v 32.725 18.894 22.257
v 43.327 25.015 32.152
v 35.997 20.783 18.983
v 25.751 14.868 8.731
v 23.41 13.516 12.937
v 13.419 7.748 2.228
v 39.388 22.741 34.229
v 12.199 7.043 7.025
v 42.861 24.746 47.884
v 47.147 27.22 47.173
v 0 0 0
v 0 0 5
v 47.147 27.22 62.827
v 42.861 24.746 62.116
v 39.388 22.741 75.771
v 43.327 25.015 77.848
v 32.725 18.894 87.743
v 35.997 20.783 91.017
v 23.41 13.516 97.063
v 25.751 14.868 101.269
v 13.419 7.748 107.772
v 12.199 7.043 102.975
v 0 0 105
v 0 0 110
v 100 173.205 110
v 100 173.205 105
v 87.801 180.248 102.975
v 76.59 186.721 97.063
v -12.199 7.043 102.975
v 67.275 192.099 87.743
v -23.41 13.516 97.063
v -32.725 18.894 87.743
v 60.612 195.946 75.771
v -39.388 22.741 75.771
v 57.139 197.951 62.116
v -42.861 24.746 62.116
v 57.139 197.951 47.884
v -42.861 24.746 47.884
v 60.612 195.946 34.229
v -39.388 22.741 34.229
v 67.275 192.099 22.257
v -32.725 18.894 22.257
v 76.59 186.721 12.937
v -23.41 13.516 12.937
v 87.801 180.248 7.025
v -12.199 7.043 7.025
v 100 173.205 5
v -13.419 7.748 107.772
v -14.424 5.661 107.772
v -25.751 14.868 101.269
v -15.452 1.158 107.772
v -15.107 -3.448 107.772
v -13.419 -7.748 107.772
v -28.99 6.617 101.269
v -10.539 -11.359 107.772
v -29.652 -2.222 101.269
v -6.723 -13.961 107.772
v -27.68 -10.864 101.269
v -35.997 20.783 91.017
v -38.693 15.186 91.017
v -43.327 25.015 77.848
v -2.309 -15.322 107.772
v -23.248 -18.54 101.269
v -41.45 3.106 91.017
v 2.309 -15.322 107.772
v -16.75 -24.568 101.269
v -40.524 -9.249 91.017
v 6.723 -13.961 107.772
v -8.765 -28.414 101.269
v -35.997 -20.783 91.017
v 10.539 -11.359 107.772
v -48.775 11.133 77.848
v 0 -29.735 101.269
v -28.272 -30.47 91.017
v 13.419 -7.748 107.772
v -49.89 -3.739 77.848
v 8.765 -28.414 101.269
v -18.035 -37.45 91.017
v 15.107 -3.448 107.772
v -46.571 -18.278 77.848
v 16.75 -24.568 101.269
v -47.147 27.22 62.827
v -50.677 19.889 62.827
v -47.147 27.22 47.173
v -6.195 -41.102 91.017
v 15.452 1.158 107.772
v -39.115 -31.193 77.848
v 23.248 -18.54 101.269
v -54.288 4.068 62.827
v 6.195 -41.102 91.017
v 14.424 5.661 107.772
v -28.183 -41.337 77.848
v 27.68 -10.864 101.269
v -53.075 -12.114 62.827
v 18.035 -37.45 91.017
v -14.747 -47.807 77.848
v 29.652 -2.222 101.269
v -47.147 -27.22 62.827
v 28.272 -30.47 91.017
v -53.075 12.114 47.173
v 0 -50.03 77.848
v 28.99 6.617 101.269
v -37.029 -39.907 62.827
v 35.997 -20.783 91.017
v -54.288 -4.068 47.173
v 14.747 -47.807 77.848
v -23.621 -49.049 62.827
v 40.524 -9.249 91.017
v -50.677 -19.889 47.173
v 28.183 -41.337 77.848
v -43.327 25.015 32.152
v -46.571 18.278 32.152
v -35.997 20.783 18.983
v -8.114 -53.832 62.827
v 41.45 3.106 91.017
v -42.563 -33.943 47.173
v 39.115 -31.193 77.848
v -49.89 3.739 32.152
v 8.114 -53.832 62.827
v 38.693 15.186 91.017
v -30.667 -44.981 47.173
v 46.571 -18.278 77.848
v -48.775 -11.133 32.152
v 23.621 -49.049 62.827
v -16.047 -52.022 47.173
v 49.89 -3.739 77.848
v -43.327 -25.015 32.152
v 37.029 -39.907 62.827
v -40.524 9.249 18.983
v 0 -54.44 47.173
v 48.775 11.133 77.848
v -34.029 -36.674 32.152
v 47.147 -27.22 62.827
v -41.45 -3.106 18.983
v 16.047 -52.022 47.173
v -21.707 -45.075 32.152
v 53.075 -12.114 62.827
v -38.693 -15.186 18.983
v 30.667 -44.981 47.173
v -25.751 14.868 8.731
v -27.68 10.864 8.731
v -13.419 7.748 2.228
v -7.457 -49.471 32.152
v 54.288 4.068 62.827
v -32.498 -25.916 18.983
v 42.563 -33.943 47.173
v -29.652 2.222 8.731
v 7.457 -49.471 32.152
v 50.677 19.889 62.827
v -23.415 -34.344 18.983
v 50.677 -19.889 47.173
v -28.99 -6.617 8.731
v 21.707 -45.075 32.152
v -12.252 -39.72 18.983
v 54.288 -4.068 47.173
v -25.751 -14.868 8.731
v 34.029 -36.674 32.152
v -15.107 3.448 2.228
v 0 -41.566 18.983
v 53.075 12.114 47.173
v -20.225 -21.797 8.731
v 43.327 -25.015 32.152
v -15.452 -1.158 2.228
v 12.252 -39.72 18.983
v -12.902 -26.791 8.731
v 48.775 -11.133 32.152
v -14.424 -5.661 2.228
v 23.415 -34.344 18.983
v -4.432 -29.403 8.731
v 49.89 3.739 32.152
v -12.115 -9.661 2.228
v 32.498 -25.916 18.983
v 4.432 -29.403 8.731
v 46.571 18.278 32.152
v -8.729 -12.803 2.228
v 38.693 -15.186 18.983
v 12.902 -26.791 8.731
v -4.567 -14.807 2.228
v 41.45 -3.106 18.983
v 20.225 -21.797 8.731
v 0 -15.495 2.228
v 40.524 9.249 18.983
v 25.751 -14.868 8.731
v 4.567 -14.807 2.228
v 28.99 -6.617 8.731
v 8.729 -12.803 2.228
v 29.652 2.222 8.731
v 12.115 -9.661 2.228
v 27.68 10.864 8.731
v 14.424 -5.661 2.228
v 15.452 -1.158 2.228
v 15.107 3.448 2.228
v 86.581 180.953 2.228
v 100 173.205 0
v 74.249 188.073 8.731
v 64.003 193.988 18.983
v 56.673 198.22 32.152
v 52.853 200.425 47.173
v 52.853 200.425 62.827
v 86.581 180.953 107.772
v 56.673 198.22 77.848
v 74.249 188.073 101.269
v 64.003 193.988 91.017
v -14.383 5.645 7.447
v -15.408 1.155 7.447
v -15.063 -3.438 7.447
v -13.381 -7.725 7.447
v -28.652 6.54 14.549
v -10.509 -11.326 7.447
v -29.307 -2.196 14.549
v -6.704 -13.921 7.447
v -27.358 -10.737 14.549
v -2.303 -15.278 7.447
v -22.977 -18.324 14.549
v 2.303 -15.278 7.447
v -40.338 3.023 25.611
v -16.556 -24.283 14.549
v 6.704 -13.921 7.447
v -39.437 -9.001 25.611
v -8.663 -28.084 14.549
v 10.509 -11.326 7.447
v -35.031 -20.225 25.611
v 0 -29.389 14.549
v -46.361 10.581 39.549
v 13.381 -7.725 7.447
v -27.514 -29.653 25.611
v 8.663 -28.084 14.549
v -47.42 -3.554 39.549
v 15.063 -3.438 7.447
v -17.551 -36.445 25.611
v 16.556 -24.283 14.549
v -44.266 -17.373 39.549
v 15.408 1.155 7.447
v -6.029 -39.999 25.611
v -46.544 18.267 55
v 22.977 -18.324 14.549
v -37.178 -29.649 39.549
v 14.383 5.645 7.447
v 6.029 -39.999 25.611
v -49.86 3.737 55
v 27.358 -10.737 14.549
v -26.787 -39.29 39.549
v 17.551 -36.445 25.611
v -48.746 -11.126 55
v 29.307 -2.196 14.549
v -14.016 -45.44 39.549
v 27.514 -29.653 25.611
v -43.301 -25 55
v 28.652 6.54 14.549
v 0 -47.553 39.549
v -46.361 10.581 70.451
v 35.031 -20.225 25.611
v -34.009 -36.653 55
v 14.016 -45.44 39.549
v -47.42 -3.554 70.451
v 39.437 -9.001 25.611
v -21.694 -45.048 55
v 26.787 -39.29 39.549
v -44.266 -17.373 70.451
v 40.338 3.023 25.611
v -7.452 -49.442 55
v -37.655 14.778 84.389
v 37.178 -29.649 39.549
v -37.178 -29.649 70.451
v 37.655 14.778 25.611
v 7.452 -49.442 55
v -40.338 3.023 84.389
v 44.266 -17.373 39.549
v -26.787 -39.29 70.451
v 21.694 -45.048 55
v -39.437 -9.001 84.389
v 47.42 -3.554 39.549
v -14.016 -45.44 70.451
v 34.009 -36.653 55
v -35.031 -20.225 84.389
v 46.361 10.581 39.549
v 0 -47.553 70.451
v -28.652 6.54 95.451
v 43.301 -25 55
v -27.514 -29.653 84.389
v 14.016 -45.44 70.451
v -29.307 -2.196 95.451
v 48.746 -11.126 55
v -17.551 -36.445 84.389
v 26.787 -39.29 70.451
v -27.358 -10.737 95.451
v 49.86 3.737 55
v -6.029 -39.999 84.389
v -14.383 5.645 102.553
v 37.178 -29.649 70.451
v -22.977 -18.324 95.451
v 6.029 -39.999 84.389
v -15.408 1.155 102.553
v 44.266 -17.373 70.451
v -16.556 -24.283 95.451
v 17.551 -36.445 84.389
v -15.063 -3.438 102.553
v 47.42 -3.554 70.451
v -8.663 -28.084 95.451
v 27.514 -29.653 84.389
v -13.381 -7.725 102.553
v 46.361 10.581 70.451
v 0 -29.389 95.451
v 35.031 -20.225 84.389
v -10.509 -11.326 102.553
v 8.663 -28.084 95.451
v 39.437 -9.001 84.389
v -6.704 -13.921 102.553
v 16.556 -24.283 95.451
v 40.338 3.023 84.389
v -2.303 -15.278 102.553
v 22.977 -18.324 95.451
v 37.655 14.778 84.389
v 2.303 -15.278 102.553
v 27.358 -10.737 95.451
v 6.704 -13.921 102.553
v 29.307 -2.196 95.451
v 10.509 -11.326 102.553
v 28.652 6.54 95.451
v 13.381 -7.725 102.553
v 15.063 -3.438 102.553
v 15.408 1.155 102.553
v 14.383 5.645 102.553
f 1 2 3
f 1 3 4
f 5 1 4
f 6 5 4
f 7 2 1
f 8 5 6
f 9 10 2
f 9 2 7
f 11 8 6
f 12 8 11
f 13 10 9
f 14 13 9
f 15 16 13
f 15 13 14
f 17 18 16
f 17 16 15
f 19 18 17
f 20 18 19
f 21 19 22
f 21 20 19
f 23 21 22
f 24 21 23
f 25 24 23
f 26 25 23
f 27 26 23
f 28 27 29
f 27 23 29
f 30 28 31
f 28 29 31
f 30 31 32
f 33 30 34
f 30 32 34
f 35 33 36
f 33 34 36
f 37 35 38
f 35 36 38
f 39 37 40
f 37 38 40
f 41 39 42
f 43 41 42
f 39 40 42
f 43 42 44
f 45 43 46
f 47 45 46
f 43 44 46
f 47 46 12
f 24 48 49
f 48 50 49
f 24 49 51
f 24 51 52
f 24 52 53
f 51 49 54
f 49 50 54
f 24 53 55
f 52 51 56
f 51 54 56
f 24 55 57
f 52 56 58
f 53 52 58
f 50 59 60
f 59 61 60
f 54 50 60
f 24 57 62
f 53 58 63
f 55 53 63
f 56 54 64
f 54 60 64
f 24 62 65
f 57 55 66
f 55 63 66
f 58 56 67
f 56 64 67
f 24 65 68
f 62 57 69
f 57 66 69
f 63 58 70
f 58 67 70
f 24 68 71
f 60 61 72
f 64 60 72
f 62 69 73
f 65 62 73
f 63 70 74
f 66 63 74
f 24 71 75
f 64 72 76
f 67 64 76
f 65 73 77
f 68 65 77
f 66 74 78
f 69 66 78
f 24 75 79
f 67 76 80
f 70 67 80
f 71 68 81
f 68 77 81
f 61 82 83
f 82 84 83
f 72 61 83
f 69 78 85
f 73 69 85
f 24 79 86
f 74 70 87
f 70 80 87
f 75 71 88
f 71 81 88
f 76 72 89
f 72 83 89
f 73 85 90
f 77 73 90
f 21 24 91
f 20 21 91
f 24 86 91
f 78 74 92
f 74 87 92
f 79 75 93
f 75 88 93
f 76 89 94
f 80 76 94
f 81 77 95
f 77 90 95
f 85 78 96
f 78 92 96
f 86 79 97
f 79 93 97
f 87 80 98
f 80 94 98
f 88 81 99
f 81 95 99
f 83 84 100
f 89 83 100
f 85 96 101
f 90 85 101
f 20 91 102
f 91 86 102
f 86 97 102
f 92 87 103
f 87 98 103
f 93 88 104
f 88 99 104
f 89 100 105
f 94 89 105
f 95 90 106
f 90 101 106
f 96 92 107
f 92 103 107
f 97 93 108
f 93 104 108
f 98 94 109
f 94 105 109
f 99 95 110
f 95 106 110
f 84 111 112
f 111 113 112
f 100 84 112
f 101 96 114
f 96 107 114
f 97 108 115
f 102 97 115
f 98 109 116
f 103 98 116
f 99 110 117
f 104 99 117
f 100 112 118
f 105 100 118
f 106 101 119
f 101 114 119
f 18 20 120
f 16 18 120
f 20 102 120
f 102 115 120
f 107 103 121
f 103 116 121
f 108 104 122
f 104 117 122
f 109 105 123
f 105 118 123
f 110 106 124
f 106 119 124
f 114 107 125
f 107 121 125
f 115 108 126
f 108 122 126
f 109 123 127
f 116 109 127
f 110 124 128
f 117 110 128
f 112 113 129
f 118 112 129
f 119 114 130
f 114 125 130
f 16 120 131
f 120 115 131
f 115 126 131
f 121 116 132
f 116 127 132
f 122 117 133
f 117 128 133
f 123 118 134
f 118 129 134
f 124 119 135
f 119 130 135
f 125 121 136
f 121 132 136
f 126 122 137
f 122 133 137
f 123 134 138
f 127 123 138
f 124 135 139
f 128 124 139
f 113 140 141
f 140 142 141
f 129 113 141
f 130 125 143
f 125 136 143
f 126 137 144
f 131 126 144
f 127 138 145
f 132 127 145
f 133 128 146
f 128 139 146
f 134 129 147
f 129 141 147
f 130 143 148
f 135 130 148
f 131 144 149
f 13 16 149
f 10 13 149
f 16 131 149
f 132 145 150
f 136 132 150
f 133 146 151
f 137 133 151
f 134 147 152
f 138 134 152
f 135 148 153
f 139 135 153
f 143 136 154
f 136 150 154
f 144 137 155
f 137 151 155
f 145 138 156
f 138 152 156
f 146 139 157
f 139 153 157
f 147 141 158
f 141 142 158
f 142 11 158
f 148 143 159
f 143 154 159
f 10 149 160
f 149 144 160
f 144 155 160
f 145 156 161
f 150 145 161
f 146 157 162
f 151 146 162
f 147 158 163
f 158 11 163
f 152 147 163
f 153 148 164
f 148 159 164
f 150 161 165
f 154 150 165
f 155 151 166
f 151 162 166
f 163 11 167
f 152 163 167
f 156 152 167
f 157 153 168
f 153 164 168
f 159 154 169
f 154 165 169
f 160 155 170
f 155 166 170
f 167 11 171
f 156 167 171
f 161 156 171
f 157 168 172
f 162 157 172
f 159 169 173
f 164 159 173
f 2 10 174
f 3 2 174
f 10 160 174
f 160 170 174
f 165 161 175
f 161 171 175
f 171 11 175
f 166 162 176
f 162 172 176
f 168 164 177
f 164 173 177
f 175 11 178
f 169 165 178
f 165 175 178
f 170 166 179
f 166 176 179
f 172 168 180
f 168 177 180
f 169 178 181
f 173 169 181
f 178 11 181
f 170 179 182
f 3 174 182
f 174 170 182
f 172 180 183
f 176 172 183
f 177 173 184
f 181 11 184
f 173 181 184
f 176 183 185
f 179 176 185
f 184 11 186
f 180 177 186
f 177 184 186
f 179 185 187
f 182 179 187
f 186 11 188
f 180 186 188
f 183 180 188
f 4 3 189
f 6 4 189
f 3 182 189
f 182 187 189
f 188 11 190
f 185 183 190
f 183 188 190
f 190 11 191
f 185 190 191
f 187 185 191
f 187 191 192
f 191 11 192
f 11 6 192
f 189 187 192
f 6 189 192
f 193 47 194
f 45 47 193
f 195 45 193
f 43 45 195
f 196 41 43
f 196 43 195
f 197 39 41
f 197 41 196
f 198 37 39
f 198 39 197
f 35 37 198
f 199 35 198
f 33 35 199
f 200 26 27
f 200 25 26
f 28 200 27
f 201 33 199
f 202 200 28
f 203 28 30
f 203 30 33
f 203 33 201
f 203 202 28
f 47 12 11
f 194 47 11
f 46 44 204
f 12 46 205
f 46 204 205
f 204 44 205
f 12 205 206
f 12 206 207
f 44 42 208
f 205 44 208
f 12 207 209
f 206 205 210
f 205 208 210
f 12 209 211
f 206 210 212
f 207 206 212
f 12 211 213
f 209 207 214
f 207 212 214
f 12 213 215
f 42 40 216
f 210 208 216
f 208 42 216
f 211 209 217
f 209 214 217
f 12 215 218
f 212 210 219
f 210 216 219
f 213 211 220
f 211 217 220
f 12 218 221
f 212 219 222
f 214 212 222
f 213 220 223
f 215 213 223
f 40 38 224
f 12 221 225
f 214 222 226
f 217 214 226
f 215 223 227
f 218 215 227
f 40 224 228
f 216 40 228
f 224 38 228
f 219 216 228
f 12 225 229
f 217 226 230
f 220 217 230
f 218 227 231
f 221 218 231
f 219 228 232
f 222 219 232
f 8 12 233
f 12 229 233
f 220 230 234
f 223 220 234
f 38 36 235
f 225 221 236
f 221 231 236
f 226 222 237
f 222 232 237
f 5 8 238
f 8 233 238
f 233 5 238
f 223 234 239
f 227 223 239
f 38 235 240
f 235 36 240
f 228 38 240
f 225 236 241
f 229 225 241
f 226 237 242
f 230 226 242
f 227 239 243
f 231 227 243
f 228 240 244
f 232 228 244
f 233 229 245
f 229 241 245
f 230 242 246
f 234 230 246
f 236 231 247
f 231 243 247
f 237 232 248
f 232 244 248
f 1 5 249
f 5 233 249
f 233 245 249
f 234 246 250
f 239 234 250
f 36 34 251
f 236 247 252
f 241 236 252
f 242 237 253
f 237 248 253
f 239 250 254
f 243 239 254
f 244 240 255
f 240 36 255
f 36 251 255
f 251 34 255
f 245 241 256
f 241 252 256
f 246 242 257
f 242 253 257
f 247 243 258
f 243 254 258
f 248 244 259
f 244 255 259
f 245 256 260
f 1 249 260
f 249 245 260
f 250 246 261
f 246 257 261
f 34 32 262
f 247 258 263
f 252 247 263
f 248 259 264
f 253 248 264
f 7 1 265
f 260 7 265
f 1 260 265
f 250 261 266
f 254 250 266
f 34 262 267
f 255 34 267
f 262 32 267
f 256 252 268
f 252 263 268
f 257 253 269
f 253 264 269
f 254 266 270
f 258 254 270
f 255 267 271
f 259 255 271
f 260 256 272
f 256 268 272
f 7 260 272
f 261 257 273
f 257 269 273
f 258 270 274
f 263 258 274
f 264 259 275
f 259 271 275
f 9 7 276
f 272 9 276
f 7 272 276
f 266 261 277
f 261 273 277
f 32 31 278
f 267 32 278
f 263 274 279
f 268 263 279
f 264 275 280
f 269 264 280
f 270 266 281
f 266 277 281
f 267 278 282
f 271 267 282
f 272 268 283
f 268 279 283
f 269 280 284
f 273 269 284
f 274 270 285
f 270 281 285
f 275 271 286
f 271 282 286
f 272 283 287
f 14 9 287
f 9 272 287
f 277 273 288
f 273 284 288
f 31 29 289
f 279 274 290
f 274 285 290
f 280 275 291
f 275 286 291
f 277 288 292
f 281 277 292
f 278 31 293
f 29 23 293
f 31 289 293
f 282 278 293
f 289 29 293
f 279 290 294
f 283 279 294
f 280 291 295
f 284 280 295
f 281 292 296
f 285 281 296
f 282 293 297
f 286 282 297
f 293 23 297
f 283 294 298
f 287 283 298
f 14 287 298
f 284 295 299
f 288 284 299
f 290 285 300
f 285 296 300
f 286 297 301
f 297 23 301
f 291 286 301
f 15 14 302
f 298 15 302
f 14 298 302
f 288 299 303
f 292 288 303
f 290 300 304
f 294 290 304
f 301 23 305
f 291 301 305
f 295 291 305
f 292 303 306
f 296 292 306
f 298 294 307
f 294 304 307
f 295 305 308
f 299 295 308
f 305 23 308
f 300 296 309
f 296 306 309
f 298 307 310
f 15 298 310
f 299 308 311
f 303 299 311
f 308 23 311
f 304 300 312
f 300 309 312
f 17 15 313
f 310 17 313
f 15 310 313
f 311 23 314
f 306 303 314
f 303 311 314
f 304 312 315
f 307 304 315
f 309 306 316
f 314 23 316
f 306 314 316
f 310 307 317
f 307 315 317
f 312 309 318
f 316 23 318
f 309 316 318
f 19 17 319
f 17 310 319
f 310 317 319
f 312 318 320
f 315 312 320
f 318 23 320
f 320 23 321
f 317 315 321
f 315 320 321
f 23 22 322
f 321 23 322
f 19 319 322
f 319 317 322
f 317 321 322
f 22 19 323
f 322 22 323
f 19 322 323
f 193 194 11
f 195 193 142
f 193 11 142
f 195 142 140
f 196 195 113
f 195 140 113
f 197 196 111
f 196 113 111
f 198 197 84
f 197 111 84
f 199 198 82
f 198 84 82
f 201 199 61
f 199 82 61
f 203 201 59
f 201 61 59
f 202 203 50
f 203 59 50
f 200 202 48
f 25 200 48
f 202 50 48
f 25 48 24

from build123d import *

# Parameters (mm, degrees)
F1_ANGLE_BACK = 120
F1_ANGLE      = 240
F3_DEPTH      = 200


with BuildPart() as f1:
    # F0 (on Right) → F1 (revolve)
    with BuildSketch(Plane.YZ, mode=Mode.PRIVATE) as f1_sk:
        with BuildLine():
            Line((0, 105), (0, 110))
            ThreePointArc((0, 110), (-55, 55), (0, 0))
            Line((0, 0), (0, 5))
            ThreePointArc((0, 5), (-50, 55), (0, 105))
        make_face()
    revolve(f1_sk.sketch.rotate(Axis((0, 0, 107.5), (0, 0, 1)), -F1_ANGLE_BACK), axis=Axis((0, 0, 107.5), (0, 0, 1)), revolution_arc=F1_ANGLE)

    # F2 (on face) → F3 (join)
    with BuildSketch(Plane(origin=(0, 0, 0), x_dir=(-0.8660254038, 0.5, 0), z_dir=(0.5, 0.8660254038, 0))):
        with BuildLine():
            ThreePointArc((0, 105), (50, 55), (0, 5))
            Line((0, 5), (0, 0))
            ThreePointArc((0, 0), (55, 55), (0, 110))
            Line((0, 110), (0, 105))
        make_face()
    extrude(amount=F3_DEPTH)


solid = f1.part
